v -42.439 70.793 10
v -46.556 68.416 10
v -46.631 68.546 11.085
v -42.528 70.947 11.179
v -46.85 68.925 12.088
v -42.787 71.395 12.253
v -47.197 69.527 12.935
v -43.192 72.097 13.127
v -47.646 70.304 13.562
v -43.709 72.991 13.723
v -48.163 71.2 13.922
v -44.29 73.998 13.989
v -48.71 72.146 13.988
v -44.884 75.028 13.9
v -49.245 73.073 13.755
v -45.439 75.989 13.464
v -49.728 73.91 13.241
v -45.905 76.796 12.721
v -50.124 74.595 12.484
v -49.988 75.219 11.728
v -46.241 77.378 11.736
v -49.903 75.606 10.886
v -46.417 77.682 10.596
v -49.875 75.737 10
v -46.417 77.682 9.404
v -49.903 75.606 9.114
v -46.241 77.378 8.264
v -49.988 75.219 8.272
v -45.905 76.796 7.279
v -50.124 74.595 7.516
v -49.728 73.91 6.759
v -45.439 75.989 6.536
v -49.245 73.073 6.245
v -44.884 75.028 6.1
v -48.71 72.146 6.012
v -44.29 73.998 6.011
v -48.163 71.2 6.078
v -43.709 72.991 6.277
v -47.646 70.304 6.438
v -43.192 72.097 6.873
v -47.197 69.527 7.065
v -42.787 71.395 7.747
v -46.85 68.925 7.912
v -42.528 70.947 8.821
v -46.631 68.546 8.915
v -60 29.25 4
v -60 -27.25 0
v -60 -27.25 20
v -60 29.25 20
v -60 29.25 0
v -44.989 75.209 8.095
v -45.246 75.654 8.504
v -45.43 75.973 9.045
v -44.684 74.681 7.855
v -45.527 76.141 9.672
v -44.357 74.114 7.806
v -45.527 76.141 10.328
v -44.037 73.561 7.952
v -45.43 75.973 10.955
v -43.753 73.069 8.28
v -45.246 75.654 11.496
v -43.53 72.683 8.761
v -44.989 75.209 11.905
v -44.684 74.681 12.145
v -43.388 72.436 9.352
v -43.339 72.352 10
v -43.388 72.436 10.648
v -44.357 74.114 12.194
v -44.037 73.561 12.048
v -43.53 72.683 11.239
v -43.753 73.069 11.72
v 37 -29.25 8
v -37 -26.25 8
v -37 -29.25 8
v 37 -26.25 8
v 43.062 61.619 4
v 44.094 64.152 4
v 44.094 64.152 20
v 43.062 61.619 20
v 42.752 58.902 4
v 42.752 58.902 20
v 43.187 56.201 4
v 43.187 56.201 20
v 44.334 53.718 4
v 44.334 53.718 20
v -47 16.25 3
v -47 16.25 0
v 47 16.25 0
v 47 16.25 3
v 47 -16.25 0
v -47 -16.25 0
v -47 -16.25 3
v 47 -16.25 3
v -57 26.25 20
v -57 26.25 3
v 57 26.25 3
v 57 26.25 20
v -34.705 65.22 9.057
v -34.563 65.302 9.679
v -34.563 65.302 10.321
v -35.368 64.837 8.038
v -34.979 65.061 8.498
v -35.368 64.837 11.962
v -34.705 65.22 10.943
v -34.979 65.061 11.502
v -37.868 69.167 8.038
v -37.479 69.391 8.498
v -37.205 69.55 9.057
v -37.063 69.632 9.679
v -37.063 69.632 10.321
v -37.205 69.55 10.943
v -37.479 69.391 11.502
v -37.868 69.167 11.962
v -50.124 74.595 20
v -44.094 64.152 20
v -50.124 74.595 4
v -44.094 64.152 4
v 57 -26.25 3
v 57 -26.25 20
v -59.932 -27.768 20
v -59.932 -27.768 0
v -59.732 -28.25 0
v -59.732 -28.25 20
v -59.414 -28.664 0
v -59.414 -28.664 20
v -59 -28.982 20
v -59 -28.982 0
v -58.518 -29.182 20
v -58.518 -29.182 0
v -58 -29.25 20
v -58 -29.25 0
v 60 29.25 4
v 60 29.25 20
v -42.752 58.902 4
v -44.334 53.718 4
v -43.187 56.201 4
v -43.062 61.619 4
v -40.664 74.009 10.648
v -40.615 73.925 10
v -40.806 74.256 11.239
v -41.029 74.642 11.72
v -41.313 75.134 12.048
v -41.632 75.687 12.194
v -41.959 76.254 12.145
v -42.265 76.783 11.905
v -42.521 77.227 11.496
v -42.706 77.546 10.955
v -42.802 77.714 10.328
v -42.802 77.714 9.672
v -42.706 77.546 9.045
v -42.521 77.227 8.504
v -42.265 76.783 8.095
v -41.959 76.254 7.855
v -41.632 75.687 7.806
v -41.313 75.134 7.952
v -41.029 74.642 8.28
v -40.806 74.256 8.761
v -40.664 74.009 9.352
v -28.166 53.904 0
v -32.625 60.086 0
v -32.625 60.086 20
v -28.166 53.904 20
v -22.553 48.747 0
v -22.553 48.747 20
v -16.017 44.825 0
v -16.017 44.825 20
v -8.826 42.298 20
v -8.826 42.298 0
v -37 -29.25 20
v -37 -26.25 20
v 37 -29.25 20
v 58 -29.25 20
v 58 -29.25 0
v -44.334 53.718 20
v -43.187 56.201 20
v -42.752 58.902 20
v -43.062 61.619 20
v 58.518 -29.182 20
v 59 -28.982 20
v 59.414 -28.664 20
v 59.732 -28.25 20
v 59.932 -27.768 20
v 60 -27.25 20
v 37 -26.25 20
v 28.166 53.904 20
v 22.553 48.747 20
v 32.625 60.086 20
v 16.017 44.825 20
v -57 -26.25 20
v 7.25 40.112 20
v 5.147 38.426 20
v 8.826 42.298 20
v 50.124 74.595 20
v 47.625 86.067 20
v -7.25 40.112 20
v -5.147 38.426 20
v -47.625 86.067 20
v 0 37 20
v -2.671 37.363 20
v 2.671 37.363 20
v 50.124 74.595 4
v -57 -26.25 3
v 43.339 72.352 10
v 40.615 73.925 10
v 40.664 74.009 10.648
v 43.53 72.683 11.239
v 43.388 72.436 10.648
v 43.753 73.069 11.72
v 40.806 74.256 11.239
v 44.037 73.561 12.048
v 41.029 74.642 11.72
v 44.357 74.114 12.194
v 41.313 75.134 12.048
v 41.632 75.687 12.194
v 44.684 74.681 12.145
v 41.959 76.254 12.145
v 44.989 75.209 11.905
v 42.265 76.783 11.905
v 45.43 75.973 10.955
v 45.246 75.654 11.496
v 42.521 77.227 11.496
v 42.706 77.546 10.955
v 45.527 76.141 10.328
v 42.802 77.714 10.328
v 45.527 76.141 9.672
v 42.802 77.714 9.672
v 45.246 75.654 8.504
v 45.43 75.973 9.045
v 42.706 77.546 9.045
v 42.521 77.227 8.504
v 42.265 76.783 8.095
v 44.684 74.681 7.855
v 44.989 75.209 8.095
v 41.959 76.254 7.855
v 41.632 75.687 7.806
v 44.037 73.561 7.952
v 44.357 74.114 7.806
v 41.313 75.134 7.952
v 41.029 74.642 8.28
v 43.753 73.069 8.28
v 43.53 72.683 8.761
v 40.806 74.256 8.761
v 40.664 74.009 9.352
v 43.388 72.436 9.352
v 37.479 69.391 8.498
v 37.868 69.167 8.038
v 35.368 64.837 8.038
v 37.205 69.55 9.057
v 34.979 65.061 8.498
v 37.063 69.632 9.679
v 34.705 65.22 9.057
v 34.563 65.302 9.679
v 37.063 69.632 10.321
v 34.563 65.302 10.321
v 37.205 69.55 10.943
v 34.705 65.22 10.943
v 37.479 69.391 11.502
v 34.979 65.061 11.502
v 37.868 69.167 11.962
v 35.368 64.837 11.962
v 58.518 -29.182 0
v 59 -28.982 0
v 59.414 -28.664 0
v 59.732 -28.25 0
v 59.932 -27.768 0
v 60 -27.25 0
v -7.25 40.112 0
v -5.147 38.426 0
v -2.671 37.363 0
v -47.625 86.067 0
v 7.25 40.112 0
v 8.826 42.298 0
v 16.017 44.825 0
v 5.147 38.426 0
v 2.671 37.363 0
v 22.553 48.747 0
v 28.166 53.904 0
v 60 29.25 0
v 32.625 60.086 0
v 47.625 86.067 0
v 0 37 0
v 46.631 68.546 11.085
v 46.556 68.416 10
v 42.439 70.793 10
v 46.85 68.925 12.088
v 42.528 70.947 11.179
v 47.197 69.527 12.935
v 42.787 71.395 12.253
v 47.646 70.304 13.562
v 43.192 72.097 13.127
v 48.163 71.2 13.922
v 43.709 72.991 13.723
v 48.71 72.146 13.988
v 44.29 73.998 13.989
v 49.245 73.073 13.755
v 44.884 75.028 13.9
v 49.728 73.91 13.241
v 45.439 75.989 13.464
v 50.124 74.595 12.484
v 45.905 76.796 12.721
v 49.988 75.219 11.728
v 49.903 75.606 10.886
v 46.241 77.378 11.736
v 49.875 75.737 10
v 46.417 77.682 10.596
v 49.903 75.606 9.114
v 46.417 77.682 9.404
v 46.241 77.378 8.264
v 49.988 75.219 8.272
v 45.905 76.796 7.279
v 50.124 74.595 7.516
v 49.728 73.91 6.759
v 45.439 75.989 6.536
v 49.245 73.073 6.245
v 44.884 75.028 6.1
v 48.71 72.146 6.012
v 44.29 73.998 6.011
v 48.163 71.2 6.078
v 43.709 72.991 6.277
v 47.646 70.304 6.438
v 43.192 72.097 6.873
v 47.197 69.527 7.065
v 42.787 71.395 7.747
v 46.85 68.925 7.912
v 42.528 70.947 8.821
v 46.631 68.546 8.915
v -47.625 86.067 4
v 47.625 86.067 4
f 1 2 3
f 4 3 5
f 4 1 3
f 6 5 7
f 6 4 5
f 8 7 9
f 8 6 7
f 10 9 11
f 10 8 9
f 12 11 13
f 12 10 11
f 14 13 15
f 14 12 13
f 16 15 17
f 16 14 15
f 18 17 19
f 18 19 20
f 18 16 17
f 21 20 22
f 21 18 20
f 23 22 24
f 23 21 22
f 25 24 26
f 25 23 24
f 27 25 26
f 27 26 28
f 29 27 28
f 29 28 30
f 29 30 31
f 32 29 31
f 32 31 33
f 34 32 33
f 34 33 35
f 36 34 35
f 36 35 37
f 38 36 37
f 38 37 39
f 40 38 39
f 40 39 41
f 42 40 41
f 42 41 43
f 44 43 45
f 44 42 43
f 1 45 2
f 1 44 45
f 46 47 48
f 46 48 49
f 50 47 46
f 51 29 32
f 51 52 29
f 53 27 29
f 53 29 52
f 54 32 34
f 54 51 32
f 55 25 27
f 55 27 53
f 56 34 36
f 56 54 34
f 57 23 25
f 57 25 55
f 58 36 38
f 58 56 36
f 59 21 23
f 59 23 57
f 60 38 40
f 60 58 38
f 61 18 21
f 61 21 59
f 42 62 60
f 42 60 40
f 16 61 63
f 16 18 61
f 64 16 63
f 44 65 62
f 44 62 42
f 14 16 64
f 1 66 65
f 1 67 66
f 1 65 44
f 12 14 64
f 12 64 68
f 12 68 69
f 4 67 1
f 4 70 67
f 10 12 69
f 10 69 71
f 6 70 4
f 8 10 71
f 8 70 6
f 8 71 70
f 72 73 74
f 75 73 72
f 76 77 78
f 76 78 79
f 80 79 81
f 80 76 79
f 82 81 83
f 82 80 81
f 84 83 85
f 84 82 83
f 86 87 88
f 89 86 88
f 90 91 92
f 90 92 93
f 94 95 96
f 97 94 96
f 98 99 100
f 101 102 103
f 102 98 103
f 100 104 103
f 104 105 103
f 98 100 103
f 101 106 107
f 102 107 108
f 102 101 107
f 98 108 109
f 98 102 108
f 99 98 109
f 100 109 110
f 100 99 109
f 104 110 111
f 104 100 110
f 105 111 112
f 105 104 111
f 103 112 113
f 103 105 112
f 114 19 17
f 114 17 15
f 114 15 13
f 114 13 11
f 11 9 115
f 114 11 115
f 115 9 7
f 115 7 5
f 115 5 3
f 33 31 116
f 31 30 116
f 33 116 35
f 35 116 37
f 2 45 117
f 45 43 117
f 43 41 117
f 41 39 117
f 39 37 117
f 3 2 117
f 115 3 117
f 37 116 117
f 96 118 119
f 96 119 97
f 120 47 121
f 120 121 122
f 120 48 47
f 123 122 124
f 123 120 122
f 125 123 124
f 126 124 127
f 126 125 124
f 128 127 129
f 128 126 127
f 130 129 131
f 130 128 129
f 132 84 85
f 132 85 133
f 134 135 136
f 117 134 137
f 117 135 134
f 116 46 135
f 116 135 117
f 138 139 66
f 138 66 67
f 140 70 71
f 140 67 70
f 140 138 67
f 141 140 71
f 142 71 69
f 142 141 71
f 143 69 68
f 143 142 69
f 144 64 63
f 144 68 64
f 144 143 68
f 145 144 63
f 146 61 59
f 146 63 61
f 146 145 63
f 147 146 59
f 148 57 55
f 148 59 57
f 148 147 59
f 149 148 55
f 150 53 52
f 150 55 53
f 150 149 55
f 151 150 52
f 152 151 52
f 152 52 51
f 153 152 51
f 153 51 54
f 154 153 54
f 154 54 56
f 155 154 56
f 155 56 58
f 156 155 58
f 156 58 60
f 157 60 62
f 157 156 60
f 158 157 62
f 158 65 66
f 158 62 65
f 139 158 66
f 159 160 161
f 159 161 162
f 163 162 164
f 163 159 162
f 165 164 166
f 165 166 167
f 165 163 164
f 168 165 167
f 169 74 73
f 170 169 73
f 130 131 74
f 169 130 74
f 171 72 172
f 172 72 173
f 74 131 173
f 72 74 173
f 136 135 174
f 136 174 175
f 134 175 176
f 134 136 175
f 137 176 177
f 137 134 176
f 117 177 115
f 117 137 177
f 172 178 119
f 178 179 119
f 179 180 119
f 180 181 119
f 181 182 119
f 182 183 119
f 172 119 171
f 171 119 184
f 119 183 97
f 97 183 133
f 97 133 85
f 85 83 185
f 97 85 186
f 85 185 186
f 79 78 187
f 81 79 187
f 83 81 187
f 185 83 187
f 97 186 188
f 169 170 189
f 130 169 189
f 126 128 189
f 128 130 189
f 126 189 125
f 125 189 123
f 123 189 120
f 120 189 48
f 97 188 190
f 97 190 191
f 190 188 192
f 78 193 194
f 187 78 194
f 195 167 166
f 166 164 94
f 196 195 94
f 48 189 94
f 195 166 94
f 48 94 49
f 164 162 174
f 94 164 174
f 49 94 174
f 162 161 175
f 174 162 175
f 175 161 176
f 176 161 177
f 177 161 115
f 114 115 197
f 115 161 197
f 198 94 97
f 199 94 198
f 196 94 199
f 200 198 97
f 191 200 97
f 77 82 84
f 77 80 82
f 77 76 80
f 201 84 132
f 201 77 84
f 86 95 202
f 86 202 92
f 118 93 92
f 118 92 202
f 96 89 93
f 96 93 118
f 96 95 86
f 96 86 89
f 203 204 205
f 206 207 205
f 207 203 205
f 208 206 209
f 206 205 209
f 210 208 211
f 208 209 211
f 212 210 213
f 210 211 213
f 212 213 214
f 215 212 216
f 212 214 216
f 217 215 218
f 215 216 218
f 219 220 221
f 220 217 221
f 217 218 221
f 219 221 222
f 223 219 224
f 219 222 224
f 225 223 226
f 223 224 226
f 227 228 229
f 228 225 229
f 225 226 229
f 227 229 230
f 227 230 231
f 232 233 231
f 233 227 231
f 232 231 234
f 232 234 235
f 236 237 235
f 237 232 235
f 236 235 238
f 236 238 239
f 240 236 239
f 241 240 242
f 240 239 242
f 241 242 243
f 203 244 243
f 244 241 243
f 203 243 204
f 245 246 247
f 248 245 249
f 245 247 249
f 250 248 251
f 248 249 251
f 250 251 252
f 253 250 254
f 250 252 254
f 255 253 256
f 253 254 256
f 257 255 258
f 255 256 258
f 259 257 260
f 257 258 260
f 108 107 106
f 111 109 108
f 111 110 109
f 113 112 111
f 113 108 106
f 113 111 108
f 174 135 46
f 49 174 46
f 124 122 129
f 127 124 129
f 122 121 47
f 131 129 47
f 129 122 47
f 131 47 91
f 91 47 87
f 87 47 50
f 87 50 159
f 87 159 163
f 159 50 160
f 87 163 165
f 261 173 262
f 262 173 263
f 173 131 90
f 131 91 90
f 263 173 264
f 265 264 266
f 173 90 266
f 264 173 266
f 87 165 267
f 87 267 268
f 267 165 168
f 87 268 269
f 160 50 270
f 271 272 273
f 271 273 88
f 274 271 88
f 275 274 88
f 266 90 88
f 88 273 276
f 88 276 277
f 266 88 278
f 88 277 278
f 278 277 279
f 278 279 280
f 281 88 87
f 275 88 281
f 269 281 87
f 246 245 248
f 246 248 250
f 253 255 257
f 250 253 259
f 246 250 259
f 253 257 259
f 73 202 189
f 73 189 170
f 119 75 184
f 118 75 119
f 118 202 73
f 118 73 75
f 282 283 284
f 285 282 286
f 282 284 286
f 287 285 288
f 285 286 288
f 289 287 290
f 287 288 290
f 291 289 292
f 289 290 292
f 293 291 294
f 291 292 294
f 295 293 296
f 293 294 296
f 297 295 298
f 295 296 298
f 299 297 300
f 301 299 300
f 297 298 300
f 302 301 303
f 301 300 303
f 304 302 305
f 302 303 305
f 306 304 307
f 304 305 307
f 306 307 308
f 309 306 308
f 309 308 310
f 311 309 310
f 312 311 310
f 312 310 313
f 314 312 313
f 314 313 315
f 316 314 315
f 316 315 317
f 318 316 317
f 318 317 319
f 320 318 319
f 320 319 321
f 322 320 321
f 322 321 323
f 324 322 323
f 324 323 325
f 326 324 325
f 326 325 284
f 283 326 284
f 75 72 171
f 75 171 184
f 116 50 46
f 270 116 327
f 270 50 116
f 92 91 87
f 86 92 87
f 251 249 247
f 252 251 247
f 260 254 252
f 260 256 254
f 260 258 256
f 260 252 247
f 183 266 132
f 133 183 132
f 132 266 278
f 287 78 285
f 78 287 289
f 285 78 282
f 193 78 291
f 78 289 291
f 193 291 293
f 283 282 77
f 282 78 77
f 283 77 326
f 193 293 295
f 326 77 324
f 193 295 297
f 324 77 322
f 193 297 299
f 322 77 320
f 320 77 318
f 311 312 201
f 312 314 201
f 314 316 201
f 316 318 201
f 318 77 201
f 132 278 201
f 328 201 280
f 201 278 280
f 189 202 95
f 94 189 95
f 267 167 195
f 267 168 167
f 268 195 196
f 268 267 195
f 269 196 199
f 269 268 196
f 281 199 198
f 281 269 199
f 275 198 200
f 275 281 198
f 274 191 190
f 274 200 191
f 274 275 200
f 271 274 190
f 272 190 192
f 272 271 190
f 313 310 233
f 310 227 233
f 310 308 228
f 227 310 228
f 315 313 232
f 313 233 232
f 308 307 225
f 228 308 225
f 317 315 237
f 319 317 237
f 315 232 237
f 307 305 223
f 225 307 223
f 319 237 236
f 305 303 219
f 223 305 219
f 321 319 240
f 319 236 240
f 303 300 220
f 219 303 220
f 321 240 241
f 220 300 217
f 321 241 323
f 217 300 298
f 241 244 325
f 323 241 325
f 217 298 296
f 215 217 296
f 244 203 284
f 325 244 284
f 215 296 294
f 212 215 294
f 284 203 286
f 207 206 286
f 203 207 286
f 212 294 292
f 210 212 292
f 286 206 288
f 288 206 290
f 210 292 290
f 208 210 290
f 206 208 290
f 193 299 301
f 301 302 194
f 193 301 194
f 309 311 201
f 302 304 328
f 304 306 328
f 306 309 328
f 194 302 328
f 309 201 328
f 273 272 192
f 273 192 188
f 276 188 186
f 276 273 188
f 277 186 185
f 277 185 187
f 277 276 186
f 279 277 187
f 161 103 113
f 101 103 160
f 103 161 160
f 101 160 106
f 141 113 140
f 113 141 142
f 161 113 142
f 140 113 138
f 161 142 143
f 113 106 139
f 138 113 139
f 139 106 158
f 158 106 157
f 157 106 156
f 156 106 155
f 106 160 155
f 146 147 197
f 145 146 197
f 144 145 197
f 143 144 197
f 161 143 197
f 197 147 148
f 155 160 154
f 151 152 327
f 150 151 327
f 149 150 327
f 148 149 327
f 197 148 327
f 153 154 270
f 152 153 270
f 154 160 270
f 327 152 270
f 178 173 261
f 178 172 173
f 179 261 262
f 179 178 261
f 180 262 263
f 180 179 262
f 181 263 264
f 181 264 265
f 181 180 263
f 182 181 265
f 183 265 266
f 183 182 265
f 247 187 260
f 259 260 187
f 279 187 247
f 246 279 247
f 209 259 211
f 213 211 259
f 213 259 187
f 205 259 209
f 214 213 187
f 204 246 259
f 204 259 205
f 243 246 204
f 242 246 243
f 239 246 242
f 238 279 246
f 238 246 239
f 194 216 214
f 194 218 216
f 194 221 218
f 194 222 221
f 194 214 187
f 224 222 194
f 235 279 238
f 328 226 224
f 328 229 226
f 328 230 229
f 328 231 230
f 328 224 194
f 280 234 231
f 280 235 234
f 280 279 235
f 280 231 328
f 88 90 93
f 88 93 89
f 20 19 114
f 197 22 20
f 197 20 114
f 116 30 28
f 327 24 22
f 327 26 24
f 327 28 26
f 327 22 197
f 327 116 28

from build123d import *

# Parameters (mm, degrees)
CYLINDER001_R               = 4
CYLINDER001_DEPTH           = 30
CYLINDER_R                  = 2.2
CYLINDER_DEPTH              = 30
COMPOUND001_PLACEMENT_ANGLE = 60
BOX001_W                    = 114
BOX001_H                    = 52.5
BOX001_DEPTH                = 20
BOX002_W                    = 94
BOX002_H                    = 32.5
BOX002_DEPTH                = 20
BOX003_W                    = 74
BOX003_H                    = 10
BOX003_DEPTH                = 15
CYLINDER002_R               = 10
CYLINDER002_DEPTH           = 50
PAD_DEPTH                   = 4
PAD001_DEPTH                = 20
CYLINDER003_W               = 2.5
CYLINDER003_H               = 5
CYLINDER003_ANGLE           = 180
COMPOUND002_PLACEMENT_ANGLE = 60
BOX_W                       = 120
BOX_H                       = 58.5
BOX_DEPTH                   = 20
FILLET_R                    = 2


with BuildPart() as bolt_head_hole:
    # Cylinder001 → Cylinder001 (new body)
    with BuildSketch(Plane.XZ.offset(14)):
        Circle(CYLINDER001_R)
    extrude(amount=CYLINDER001_DEPTH)


with BuildPart() as bolt_hole_array_compound:
    # Cylinder → Cylinder (new body)
    with BuildSketch(Plane.XZ):
        Circle(CYLINDER_R)
    extrude(amount=CYLINDER_DEPTH)

    # Fusion002: union bolt head hole
    add(bolt_head_hole.part)


with BuildPart() as bolt_hole_array_compound_1:
    # Compound001 placement: moved
    add(bolt_hole_array_compound.part.moved(Location((-32.3149, 81.256849, 10))).rotate(Axis((-32.3149, 81.256849, 10), (0, 0, -1)), COMPOUND001_PLACEMENT_ANGLE))


with BuildPart() as part_mirroring:
    # Part__Mirroring: instance of bolt hole array compound
    add(bolt_hole_array_compound_1.part.mirror(Plane(origin=(0, 0, 0), x_dir=(0, -1, 0), z_dir=(1, 0, 0))))


with BuildPart() as pocketl_cube:
    # Box001 → Box001 (new body)
    with BuildSketch(Plane(origin=(-57, -26.25, 3), x_dir=(1, 0, 0), z_dir=(0, 0, 1))):
        with Locations((57, 26.25)):
            Rectangle(BOX001_W, BOX001_H)
    extrude(amount=BOX001_DEPTH)


with BuildPart() as hole_through_pocketl_cube:
    # Box002 → Box002 (new body)
    with BuildSketch(Plane(origin=(-47, -16.25, 0), x_dir=(1, 0, 0), z_dir=(0, 0, 1))):
        with Locations((47, 16.25)):
            Rectangle(BOX002_W, BOX002_H)
    extrude(amount=BOX002_DEPTH)


with BuildPart() as switch_pocket:
    # Box003 → Box003 (new body)
    with BuildSketch(Plane(origin=(-37, -31.25, 8), x_dir=(1, 0, 0), z_dir=(0, 0, 1))):
        with Locations((37, 5)):
            Rectangle(BOX003_W, BOX003_H)
    extrude(amount=BOX003_DEPTH)


with BuildPart() as center_remove_cylinder:
    # Cylinder002 → Cylinder002 (new body)
    with BuildSketch(Plane(origin=(0, 47, -25), x_dir=(1, 0, 0), z_dir=(0, 0, 1))):
        Circle(CYLINDER002_R)
    extrude(amount=CYLINDER002_DEPTH)


with BuildPart() as extract_fusion:
    # Fusion003 base: copy of bolt hole array compound
    add(bolt_hole_array_compound_1.part)

    # Fusion003: union Part__Mirroring, pocketl cube, hole through pocketl cube, switch pocket, center remove cylinder
    add(part_mirroring.part)
    add(pocketl_cube.part)
    add(hole_through_pocketl_cube.part)
    add(switch_pocket.part)
    add(center_remove_cylinder.part)


with BuildPart() as bottom_body:
    # Sketch → Pad (new body)
    with BuildSketch(Plane.XY):
        with BuildLine():
            Line((-60, 29.25), (60, 29.25))
            Line((60, 29.25), (47.625, 86.066815))
            Line((32.625, 60.086053), (47.625, 86.066815))
            ThreePointArc((-32.625, 60.086053), (0, 41.25), (32.625, 60.086053))
            Line((-32.625, 60.086053), (-47.625, 86.066815))
            Line((-60, 29.25), (-47.625, 86.066815))
        make_face()
    extrude(amount=PAD_DEPTH)


with BuildPart() as bolt_wall_body:
    # Sketch001 → Pad001 (new body)
    with BuildSketch(Plane.XY):
        with BuildLine():
            Line((-47.625, 86.066815), (-32.625, 60.086053))
            ThreePointArc((-32.625, 60.086053), (0, 41.25), (32.625, 60.086053))
            Line((32.625, 60.086053), (47.625, 86.066815))
            Line((50.123562, 74.595272), (47.625, 86.066815))
            Line((44.094416, 64.152484), (50.123562, 74.595272))
            ThreePointArc((44.094416, 64.152484), (42.751879, 58.90179), (44.333925, 53.718226))
            Line((44.333925, 53.718226), (60, 29.25))
            Line((60, 29.25), (-60, 29.25))
            Line((-44.333925, 53.718226), (-60, 29.25))
            ThreePointArc((-44.333925, 53.718226), (-42.751879, 58.90179), (-44.094416, 64.152484))
            Line((-50.123562, 74.595272), (-44.094416, 64.152484))
            Line((-50.123562, 74.595272), (-47.625, 86.066815))
        make_face()
    extrude(amount=PAD001_DEPTH)


with BuildPart() as bolt_hole_array_compound001:
    # Cylinder003 → Cylinder003 (revolve)
    with BuildSketch(Plane(origin=(0, 0, 0), x_dir=(0, 0, -1), z_dir=(0, -1, 0))):
        with Locations((1.25, 2.5)):
            Rectangle(CYLINDER003_W, CYLINDER003_H)
    revolve(axis=Axis((0, 0, 0), (1, 0, 0)), revolution_arc=CYLINDER003_ANGLE)


with BuildPart() as bolt_hole_array_compound001_1:
    # Compound002 placement: moved
    add(bolt_hole_array_compound001.part.moved(Location((-39.21, 68.392051, 10))).rotate(Axis((-39.21, 68.392051, 10), (0, 0, -1)), COMPOUND002_PLACEMENT_ANGLE))


with BuildPart() as part_mirroring003:
    # Part__Mirroring003: instance of bolt hole array compound001
    add(bolt_hole_array_compound001_1.part.mirror(Plane(origin=(0, 0, 0), x_dir=(0, -1, 0), z_dir=(1, 0, 0))))


with BuildPart() as bolt_wall_body_cut:
    # Box → Box (new body)
    with BuildSketch(Plane(origin=(-60, -29.25, 0), x_dir=(1, 0, 0), z_dir=(0, 0, 1))):
        with Locations((60, 29.25)):
            Rectangle(BOX_W, BOX_H)
    extrude(amount=BOX_DEPTH)

    # Fillet
    fillet_edges = [bolt_wall_body_cut.edges().sort_by_distance(p)[0] for p in [
        (-60, -29.25, 10),
        (60, -29.25, 10),
    ]]
    fillet(fillet_edges, radius=FILLET_R)

    # Fusion: union bottom_body, bolt wall body, bolt hole array compound001, Part__Mirroring003
    add(bottom_body.part)
    add(bolt_wall_body.part)
    add(bolt_hole_array_compound001_1.part)
    add(part_mirroring003.part)

    # Cut001: cut extract fusion
    add(extract_fusion.part, mode=Mode.SUBTRACT)


solid = bolt_wall_body_cut.part
